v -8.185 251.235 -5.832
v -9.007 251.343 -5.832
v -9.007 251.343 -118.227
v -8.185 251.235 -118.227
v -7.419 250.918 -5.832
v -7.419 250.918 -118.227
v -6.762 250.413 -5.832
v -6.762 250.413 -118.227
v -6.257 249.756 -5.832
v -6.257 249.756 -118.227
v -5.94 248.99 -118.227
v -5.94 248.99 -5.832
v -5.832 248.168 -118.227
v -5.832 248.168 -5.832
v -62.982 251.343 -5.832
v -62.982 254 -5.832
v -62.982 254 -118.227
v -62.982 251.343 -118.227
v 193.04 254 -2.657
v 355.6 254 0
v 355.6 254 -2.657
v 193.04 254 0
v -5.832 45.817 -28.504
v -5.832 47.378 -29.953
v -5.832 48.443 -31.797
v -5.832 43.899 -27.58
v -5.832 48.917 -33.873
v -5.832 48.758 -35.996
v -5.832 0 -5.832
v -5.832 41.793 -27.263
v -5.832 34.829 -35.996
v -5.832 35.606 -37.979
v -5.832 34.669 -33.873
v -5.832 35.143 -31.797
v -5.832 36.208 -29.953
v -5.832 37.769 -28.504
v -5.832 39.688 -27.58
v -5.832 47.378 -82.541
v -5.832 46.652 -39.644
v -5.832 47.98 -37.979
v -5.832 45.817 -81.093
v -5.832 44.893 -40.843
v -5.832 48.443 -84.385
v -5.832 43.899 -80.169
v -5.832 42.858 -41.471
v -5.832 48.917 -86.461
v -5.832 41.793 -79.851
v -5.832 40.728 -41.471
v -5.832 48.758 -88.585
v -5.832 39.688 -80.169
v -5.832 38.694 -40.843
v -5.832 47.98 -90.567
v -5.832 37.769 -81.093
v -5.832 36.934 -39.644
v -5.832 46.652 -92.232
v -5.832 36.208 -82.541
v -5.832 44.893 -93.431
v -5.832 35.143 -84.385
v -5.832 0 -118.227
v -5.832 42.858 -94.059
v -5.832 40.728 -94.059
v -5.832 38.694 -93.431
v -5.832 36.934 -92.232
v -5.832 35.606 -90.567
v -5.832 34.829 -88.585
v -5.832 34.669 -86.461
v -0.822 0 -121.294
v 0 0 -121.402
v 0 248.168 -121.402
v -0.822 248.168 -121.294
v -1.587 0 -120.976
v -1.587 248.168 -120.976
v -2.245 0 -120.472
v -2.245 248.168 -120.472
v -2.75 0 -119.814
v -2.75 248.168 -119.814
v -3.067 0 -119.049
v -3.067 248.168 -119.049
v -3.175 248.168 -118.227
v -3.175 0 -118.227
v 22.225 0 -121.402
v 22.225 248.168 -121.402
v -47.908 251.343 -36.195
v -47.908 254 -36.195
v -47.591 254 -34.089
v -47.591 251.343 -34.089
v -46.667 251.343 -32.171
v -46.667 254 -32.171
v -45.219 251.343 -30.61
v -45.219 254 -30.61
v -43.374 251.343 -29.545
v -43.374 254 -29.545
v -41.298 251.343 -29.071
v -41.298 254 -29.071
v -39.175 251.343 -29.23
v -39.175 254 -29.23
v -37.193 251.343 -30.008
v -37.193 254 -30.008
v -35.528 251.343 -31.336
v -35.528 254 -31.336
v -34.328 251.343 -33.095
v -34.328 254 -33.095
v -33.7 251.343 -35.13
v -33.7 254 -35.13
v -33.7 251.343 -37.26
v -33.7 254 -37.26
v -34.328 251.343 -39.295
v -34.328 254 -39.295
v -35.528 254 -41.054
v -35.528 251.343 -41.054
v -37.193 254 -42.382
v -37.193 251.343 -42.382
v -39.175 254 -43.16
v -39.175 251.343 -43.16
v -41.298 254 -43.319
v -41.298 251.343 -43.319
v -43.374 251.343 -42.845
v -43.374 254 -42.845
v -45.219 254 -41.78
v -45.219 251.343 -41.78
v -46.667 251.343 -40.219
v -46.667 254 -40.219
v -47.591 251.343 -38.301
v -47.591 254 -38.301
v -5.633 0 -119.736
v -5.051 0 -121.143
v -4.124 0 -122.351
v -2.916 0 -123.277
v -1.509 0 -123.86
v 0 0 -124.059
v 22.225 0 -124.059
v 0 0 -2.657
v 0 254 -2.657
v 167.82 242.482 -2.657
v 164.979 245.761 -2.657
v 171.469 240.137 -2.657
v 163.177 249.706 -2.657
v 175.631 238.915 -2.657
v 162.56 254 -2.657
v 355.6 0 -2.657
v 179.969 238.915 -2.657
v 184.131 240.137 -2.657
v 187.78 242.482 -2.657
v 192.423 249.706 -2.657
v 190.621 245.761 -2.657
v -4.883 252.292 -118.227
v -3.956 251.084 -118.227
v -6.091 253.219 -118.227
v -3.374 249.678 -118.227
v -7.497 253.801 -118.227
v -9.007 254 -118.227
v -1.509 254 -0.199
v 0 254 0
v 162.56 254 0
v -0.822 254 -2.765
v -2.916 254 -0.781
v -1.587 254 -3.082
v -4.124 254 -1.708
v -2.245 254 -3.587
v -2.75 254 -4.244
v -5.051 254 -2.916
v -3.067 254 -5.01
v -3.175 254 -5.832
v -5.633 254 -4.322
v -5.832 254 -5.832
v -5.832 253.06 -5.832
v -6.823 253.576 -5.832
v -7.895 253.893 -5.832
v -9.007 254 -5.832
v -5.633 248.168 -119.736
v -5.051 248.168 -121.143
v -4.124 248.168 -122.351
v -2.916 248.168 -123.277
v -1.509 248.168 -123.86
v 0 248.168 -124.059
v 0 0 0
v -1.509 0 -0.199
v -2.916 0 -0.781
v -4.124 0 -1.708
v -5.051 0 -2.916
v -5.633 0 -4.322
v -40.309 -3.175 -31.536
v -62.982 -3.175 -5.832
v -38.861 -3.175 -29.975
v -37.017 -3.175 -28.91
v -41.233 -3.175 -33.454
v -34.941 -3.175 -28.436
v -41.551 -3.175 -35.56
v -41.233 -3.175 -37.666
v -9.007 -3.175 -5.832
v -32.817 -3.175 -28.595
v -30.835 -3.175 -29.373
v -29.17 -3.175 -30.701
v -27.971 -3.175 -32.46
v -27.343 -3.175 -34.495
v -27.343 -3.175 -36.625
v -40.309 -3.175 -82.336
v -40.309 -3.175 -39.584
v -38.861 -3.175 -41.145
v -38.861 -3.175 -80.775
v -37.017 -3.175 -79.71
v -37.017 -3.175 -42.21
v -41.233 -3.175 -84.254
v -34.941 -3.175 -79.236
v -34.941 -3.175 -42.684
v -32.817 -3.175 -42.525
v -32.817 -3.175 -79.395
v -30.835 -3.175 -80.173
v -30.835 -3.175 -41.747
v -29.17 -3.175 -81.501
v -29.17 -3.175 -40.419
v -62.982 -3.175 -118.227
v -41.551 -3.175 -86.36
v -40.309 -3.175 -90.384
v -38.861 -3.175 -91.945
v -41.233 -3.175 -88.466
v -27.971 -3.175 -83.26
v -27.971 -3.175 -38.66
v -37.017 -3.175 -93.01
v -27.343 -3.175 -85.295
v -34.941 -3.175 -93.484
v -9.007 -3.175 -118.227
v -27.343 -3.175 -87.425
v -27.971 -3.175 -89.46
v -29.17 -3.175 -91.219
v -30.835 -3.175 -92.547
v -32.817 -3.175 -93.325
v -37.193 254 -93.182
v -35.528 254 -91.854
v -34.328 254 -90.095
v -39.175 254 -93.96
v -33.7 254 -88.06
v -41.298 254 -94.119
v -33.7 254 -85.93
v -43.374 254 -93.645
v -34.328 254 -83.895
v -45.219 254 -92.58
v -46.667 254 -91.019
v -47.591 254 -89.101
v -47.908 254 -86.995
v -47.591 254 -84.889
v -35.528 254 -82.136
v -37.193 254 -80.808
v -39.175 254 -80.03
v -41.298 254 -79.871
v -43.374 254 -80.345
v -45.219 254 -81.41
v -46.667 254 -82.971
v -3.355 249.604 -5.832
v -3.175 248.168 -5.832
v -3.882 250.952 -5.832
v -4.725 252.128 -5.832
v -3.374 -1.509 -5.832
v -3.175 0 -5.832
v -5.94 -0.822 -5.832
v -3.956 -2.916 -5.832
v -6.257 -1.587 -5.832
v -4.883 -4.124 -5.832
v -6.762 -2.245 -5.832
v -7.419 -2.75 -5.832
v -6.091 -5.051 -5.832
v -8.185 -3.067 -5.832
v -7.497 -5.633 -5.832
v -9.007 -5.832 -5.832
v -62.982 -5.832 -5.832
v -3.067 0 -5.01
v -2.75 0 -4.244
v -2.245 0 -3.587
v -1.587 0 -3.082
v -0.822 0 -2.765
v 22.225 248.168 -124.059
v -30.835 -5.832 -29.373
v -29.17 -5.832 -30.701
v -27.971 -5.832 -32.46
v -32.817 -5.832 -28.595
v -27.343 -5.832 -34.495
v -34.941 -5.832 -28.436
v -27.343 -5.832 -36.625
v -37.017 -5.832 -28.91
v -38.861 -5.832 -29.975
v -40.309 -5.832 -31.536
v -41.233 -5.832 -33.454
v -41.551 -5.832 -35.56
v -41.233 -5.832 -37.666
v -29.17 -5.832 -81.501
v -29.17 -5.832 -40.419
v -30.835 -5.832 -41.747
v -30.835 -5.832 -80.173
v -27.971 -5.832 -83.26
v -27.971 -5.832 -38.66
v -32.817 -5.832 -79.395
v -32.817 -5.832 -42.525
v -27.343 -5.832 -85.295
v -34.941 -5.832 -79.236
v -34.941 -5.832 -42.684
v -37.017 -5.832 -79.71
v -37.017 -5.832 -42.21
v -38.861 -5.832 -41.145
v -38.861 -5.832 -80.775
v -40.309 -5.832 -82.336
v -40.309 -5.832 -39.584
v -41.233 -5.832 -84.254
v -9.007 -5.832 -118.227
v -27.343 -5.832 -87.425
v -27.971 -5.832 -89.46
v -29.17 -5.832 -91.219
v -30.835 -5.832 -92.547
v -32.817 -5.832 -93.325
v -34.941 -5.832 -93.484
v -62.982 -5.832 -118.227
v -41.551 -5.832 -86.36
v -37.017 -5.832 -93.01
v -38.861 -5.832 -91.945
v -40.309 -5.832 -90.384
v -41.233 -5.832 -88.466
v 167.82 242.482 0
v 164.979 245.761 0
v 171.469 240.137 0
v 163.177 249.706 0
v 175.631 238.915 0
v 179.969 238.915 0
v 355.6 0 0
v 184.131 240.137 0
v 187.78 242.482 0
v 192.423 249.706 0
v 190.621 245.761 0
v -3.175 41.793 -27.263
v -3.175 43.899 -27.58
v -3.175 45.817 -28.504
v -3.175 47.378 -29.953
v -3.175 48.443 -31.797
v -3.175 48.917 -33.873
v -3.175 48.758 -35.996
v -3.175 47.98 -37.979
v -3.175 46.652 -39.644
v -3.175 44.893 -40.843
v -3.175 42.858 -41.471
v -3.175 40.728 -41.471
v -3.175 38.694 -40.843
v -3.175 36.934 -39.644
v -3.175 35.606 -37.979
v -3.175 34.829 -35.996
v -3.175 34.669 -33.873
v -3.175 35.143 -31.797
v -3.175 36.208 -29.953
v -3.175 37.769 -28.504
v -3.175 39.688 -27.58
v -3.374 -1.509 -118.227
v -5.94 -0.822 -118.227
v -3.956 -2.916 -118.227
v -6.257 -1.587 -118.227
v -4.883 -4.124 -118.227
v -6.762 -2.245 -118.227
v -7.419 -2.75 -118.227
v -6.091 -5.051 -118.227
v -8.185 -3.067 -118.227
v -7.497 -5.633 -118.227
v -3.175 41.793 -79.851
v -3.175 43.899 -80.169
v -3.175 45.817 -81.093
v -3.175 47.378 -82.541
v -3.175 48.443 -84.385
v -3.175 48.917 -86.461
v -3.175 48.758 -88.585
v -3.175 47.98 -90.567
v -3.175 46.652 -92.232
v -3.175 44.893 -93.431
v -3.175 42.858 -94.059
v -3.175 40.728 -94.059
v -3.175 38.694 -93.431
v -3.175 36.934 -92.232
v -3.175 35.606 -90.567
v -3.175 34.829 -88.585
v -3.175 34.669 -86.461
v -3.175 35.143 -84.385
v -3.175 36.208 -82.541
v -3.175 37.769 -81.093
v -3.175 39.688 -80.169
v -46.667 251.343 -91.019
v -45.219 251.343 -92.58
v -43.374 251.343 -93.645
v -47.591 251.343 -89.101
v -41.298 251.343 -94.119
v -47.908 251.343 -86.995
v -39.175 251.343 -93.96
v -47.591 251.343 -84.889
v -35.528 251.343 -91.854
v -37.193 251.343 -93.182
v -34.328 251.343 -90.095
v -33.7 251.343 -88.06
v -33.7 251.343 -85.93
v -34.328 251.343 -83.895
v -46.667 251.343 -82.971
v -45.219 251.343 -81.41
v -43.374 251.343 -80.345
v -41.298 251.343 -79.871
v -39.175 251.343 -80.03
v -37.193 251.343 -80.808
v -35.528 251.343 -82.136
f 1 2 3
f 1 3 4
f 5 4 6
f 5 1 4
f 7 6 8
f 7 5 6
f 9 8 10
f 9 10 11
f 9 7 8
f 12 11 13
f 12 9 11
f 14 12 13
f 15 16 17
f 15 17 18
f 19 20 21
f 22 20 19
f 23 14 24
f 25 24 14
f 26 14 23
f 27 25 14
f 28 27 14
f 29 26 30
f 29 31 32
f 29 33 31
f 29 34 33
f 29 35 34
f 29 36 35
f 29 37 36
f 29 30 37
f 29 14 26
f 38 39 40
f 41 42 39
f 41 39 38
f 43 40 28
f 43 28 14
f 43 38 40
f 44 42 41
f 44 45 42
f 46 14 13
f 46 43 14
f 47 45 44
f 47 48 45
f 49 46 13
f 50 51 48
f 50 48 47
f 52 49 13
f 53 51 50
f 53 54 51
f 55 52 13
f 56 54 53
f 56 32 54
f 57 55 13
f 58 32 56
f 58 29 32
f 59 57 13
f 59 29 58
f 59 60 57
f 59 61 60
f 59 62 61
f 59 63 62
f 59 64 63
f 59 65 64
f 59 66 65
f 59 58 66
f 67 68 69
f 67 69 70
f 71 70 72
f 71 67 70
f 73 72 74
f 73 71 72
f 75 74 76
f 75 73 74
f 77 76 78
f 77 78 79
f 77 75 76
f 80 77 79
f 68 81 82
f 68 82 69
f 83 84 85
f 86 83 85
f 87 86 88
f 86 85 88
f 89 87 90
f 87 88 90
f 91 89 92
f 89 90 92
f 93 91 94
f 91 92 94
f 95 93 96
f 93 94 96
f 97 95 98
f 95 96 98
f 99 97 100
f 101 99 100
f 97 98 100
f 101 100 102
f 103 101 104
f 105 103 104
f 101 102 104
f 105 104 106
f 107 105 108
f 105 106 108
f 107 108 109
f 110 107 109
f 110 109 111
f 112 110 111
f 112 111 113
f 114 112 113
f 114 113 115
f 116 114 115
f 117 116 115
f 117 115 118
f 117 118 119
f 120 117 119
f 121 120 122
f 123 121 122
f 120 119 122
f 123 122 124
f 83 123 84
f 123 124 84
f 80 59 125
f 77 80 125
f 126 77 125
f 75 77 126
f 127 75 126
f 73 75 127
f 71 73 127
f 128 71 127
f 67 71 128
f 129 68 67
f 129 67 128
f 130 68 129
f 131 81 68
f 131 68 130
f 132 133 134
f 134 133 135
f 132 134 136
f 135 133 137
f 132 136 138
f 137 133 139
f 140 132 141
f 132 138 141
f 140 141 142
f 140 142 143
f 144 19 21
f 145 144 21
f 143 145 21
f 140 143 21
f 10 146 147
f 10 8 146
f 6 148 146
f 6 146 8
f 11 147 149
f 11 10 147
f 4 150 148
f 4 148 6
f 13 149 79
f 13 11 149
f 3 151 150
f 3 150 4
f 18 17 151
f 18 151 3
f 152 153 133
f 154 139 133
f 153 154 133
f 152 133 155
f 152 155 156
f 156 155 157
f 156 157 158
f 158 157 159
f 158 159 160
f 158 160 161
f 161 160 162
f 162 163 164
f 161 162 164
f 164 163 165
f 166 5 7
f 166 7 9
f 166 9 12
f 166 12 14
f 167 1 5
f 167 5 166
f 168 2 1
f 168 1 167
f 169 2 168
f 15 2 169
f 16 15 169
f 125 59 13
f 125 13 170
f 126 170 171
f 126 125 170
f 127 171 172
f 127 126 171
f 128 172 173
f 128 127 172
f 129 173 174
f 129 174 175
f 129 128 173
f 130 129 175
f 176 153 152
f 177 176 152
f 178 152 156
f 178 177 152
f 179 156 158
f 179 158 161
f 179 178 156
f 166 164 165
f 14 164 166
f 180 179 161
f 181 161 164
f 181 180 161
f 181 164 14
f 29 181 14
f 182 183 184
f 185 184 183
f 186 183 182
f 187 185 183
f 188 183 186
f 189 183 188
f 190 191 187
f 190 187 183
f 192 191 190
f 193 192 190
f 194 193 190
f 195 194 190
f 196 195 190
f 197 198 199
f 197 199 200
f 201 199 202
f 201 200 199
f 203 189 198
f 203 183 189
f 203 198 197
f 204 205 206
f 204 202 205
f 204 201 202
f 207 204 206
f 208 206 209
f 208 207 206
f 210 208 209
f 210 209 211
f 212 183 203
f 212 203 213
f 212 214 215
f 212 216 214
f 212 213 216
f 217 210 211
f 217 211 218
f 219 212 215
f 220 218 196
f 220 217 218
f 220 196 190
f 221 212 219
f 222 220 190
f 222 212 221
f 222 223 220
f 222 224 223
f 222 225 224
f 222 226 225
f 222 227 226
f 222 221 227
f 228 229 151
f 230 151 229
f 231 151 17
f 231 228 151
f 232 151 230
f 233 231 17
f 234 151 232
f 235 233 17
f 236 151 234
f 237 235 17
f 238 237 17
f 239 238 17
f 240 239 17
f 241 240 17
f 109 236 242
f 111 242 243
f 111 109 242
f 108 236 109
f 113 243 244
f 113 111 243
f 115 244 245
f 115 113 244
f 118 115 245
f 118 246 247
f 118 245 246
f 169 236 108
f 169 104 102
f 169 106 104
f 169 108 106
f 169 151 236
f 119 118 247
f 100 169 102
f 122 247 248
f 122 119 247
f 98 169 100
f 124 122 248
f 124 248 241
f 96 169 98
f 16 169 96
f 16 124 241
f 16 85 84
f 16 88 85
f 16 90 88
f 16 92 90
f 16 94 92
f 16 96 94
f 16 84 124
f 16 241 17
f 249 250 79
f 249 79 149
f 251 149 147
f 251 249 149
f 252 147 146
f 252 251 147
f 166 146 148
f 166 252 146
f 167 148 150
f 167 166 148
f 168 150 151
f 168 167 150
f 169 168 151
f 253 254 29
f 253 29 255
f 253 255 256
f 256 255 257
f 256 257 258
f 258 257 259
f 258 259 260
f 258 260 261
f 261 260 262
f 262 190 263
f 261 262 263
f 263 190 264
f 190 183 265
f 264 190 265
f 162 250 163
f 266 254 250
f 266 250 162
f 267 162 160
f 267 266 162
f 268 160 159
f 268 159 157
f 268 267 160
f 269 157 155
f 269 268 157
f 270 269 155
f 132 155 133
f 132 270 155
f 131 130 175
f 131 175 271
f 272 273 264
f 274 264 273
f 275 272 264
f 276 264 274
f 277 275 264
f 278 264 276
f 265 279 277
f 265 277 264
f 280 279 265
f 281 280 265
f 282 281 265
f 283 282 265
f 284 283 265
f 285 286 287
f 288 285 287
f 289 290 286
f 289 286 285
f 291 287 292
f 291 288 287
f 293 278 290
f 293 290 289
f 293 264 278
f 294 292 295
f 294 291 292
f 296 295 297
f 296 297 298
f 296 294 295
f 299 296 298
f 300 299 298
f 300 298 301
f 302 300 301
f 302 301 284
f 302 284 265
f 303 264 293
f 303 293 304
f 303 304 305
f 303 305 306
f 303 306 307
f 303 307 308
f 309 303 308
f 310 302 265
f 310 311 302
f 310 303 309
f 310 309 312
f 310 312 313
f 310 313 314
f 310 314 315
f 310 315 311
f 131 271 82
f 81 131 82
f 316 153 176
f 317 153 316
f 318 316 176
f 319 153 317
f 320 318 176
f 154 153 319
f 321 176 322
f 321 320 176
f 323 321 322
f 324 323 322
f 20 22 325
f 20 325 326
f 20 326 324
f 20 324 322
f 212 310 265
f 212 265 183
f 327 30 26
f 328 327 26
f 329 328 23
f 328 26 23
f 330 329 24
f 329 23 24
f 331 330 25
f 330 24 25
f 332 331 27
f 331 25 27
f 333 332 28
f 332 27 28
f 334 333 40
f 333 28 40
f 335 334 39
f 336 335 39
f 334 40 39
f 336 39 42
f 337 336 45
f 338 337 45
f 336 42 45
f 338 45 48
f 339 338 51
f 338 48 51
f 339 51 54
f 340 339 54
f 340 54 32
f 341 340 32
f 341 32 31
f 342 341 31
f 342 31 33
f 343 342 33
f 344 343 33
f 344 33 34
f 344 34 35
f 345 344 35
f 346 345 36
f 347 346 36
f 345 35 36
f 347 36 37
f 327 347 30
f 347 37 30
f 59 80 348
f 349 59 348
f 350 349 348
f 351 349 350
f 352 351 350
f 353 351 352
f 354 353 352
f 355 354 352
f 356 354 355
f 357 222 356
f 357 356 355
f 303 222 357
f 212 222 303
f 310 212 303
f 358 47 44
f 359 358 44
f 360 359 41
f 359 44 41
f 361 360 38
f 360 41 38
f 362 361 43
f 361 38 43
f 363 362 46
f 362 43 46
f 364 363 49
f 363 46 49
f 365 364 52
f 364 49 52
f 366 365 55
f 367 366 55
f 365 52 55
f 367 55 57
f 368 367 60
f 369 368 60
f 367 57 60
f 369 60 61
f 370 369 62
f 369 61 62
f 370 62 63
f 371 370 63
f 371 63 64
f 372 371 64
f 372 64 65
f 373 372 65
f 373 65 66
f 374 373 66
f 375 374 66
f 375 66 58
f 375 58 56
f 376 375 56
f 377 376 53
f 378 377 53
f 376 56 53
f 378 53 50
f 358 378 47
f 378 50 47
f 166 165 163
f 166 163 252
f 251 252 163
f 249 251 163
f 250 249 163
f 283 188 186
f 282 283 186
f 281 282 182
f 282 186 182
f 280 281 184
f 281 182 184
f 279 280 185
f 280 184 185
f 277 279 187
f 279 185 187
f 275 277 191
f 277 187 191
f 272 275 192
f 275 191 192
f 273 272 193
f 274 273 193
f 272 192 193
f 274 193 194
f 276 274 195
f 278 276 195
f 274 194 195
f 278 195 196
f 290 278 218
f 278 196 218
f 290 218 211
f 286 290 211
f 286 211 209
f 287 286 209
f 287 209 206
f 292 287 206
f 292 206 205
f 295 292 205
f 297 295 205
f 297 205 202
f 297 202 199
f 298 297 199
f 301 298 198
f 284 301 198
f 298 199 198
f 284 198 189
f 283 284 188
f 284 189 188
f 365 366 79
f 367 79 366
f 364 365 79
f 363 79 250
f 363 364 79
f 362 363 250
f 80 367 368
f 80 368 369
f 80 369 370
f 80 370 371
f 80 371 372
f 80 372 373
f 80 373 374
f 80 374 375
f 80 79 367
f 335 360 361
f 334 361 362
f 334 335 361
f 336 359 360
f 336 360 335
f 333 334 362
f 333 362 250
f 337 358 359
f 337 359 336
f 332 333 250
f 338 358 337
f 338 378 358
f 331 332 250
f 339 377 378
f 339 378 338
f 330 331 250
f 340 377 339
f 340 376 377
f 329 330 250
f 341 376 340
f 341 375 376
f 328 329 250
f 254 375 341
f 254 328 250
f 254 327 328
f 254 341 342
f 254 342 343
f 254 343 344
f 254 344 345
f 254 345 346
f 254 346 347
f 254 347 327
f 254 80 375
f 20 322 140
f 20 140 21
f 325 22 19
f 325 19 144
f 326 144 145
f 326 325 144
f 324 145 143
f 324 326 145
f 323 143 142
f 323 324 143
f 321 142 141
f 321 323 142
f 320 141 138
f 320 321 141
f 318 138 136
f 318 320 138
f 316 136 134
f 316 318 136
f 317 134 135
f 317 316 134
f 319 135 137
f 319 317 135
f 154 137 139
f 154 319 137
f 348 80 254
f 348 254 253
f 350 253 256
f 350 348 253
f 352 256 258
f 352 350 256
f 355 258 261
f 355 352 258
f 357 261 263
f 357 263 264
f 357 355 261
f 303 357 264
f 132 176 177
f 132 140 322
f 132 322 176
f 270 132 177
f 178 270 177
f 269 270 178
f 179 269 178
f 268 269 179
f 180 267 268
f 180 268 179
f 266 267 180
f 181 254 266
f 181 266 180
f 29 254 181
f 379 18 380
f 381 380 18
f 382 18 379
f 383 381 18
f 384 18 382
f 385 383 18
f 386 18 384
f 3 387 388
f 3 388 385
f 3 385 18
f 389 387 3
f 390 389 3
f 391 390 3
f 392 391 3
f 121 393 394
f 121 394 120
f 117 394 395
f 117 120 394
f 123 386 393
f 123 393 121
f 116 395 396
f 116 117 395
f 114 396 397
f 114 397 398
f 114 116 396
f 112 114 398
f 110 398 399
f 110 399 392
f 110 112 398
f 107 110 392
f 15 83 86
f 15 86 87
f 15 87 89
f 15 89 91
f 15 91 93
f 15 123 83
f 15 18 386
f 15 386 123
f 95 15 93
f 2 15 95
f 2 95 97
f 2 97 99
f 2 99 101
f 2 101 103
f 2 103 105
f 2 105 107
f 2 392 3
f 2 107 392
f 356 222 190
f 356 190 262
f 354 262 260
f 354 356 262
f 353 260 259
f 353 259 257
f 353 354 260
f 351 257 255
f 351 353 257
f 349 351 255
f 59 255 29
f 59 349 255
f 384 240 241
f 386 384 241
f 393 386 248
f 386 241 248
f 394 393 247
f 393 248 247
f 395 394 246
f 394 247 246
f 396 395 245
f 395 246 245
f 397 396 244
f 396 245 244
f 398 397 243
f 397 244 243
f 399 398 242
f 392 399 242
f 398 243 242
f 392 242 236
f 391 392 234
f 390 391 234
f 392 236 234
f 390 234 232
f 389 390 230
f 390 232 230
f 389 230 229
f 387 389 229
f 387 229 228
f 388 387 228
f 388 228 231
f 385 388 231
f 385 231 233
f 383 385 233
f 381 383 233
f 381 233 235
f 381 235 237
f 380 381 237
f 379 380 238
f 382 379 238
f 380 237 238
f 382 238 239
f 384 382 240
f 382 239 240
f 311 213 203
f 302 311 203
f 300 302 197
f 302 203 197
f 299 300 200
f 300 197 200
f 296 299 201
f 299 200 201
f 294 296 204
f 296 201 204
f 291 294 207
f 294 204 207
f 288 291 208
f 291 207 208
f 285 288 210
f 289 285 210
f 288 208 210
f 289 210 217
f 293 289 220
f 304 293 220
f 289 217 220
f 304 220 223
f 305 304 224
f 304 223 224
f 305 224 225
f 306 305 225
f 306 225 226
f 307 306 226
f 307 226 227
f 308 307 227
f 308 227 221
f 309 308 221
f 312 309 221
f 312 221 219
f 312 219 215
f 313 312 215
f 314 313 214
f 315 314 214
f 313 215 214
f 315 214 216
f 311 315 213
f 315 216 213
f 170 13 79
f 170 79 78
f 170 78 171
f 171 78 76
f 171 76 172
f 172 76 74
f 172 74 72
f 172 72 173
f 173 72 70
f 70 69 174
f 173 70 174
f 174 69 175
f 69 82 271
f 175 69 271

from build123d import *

# Parameters (mm, degrees)
BASE_FLANGE1_DEPTH           = 2.65684
EDGE_FLANGE1_DEPTH           = 254
EDGE_FLANGE2_STRIP_W         = 16.97736
EDGE_FLANGE2_STRIP_H         = 2.65684
EDGE_FLANGE2_STRIP_CUT_DEPTH = 112.395
EDGE_FLANGE2_DEPTH           = 112.395
EDGE_FLANGE3_DEPTH           = 112.395
EDGE_FLANGE4_DEPTH           = 248.16816
SKETCH22_R                   = 7.14375
CUT_EXTRUDE1_DEPTH           = 2.65684
SKETCH23_R                   = 7.14375
CUT_EXTRUDE2_DEPTH           = 2.65684
SKETCH24_R                   = 7.14375
CUT_EXTRUDE3_DEPTH           = 2.65684


# Sheet-metal steps are written as plain solids
with BuildPart() as part:
    # Sketch1 → Base-Flange1 (new body)
    with BuildSketch(Plane.XY):
        with BuildLine():
            Line((0, 0), (355.6, 0))
            Line((355.6, 0), (355.6, 254))
            Line((355.6, 254), (193.04, 254))
            ThreePointArc((193.04, 254), (177.8, 238.76), (162.56, 254))
            Line((162.56, 254), (0, 254))
            Line((0, 254), (0, 0))
        make_face()
    extrude(amount=-BASE_FLANGE1_DEPTH)

    # Edge-Flange1 section (across the edge) → Edge-Flange1 (add)
    with BuildSketch(Plane(origin=(-3.175, 0, -2.65684), x_dir=(1, 0, 0), z_dir=(0, 1, 0))):
        with BuildLine():
            Line((-2.65684, 3.175), (-2.65684, 115.57))
            Line((-2.65684, 115.57), (0, 115.57))
            Line((0, 115.57), (0, 3.175))
            ThreePointArc((0, 3.175), (0.92993597, 0.92993597), (3.175, 0))
            Line((3.175, 0), (3.175, -2.65684))
            ThreePointArc((3.175, -2.65684), (-0.948733611, -0.948733611), (-2.65684, 3.175))
        make_face()
    extrude(amount=EDGE_FLANGE1_DEPTH)

    # Edge-Flange2 strip (across the edge) → Edge-Flange2 strip cut (cut)
    with BuildSketch(Plane(origin=(-5.83184, 254, -5.83184), x_dir=(0, -1, 0), z_dir=(0, 0, -1))):
        with Locations((-2.65684, -1.32842)):
            Rectangle(EDGE_FLANGE2_STRIP_W, EDGE_FLANGE2_STRIP_H)
    extrude(amount=EDGE_FLANGE2_STRIP_CUT_DEPTH, mode=Mode.SUBTRACT)

    # Edge-Flange2 section (across the edge) → Edge-Flange2 (add)
    with BuildSketch(Plane(origin=(-5.83184, 254, -5.83184), x_dir=(0, -1, 0), z_dir=(0, 0, -1))):
        with BuildLine():
            Line((0, 3.175), (0, 57.15))
            Line((0, 57.15), (2.65684, 57.15))
            Line((2.65684, 57.15), (2.65684, 3.175))
            ThreePointArc((2.65684, 3.175), (3.58677597, 0.92993597), (5.83184, 0))
            Line((5.83184, 0), (5.83184, -2.65684))
            ThreePointArc((5.83184, -2.65684), (1.708106389, -0.948733611), (0, 3.175))
        make_face()
    extrude(amount=EDGE_FLANGE2_DEPTH)

    # Edge-Flange3 section (across the edge) → Edge-Flange3 (add)
    with BuildSketch(Plane(origin=(-5.83184, -3.175, -118.22684), x_dir=(0, 1, 0), z_dir=(0, 0, 1))):
        with BuildLine():
            Line((-2.65684, 3.175), (-2.65684, 57.15))
            Line((-2.65684, 57.15), (0, 57.15))
            Line((0, 57.15), (0, 3.175))
            ThreePointArc((0, 3.175), (0.92993597, 0.92993597), (3.175, 0))
            Line((3.175, 0), (3.175, -2.65684))
            ThreePointArc((3.175, -2.65684), (-0.948733611, -0.948733611), (-2.65684, 3.175))
        make_face()
    extrude(amount=EDGE_FLANGE3_DEPTH)

    # Edge-Flange4 section (across the edge) → Edge-Flange4 (add)
    with BuildSketch(Plane(origin=(-3.175, 0, -121.40184), x_dir=(0, 0, 1), z_dir=(0, 1, 0))):
        with BuildLine():
            Line((-2.65684, 3.175), (-2.65684, 25.4))
            Line((-2.65684, 25.4), (0, 25.4))
            Line((0, 25.4), (0, 3.175))
            ThreePointArc((0, 3.175), (0.92993597, 0.92993597), (3.175, 0))
            Line((3.175, 0), (3.175, -2.65684))
            ThreePointArc((3.175, -2.65684), (-0.948733611, -0.948733611), (-2.65684, 3.175))
        make_face()
    extrude(amount=EDGE_FLANGE4_DEPTH)

    # Sketch22 → Cut-Extrude1 (cut)
    with BuildSketch(Plane(origin=(0, 254, 0), x_dir=(1, 0, 0), z_dir=(0, 1, 0))):
        with Locations(Location((-40.76446, 86.995, 0), (0, 0, 180))):
            Circle(SKETCH22_R)
        with Locations(Location((-40.76446, 36.195, 0), (0, 0, 180))):
            Circle(SKETCH22_R)
    extrude(amount=-CUT_EXTRUDE1_DEPTH, mode=Mode.SUBTRACT)

    # Sketch23 → Cut-Extrude2 (cut)
    with BuildSketch(Plane(origin=(0, -3.175, 0), x_dir=(1, 0, 0), z_dir=(0, 1, 0))):
        with Locations(Location((-34.40684, 86.36, 0), (0, 0, 180))):
            Circle(SKETCH23_R)
        with Locations(Location((-34.40684, 35.56, 0), (0, 0, 180))):
            Circle(SKETCH23_R)
    extrude(amount=-CUT_EXTRUDE2_DEPTH, mode=Mode.SUBTRACT)

    # Sketch24 → Cut-Extrude3 (cut)
    with BuildSketch(Plane.ZY.offset(5.83184)):
        with Locations((-86.995, 41.79316)):
            Circle(SKETCH24_R)
        with Locations((-34.40684, 41.79316)):
            Circle(SKETCH24_R)
    extrude(amount=-CUT_EXTRUDE3_DEPTH, mode=Mode.SUBTRACT)


solid = part.part
